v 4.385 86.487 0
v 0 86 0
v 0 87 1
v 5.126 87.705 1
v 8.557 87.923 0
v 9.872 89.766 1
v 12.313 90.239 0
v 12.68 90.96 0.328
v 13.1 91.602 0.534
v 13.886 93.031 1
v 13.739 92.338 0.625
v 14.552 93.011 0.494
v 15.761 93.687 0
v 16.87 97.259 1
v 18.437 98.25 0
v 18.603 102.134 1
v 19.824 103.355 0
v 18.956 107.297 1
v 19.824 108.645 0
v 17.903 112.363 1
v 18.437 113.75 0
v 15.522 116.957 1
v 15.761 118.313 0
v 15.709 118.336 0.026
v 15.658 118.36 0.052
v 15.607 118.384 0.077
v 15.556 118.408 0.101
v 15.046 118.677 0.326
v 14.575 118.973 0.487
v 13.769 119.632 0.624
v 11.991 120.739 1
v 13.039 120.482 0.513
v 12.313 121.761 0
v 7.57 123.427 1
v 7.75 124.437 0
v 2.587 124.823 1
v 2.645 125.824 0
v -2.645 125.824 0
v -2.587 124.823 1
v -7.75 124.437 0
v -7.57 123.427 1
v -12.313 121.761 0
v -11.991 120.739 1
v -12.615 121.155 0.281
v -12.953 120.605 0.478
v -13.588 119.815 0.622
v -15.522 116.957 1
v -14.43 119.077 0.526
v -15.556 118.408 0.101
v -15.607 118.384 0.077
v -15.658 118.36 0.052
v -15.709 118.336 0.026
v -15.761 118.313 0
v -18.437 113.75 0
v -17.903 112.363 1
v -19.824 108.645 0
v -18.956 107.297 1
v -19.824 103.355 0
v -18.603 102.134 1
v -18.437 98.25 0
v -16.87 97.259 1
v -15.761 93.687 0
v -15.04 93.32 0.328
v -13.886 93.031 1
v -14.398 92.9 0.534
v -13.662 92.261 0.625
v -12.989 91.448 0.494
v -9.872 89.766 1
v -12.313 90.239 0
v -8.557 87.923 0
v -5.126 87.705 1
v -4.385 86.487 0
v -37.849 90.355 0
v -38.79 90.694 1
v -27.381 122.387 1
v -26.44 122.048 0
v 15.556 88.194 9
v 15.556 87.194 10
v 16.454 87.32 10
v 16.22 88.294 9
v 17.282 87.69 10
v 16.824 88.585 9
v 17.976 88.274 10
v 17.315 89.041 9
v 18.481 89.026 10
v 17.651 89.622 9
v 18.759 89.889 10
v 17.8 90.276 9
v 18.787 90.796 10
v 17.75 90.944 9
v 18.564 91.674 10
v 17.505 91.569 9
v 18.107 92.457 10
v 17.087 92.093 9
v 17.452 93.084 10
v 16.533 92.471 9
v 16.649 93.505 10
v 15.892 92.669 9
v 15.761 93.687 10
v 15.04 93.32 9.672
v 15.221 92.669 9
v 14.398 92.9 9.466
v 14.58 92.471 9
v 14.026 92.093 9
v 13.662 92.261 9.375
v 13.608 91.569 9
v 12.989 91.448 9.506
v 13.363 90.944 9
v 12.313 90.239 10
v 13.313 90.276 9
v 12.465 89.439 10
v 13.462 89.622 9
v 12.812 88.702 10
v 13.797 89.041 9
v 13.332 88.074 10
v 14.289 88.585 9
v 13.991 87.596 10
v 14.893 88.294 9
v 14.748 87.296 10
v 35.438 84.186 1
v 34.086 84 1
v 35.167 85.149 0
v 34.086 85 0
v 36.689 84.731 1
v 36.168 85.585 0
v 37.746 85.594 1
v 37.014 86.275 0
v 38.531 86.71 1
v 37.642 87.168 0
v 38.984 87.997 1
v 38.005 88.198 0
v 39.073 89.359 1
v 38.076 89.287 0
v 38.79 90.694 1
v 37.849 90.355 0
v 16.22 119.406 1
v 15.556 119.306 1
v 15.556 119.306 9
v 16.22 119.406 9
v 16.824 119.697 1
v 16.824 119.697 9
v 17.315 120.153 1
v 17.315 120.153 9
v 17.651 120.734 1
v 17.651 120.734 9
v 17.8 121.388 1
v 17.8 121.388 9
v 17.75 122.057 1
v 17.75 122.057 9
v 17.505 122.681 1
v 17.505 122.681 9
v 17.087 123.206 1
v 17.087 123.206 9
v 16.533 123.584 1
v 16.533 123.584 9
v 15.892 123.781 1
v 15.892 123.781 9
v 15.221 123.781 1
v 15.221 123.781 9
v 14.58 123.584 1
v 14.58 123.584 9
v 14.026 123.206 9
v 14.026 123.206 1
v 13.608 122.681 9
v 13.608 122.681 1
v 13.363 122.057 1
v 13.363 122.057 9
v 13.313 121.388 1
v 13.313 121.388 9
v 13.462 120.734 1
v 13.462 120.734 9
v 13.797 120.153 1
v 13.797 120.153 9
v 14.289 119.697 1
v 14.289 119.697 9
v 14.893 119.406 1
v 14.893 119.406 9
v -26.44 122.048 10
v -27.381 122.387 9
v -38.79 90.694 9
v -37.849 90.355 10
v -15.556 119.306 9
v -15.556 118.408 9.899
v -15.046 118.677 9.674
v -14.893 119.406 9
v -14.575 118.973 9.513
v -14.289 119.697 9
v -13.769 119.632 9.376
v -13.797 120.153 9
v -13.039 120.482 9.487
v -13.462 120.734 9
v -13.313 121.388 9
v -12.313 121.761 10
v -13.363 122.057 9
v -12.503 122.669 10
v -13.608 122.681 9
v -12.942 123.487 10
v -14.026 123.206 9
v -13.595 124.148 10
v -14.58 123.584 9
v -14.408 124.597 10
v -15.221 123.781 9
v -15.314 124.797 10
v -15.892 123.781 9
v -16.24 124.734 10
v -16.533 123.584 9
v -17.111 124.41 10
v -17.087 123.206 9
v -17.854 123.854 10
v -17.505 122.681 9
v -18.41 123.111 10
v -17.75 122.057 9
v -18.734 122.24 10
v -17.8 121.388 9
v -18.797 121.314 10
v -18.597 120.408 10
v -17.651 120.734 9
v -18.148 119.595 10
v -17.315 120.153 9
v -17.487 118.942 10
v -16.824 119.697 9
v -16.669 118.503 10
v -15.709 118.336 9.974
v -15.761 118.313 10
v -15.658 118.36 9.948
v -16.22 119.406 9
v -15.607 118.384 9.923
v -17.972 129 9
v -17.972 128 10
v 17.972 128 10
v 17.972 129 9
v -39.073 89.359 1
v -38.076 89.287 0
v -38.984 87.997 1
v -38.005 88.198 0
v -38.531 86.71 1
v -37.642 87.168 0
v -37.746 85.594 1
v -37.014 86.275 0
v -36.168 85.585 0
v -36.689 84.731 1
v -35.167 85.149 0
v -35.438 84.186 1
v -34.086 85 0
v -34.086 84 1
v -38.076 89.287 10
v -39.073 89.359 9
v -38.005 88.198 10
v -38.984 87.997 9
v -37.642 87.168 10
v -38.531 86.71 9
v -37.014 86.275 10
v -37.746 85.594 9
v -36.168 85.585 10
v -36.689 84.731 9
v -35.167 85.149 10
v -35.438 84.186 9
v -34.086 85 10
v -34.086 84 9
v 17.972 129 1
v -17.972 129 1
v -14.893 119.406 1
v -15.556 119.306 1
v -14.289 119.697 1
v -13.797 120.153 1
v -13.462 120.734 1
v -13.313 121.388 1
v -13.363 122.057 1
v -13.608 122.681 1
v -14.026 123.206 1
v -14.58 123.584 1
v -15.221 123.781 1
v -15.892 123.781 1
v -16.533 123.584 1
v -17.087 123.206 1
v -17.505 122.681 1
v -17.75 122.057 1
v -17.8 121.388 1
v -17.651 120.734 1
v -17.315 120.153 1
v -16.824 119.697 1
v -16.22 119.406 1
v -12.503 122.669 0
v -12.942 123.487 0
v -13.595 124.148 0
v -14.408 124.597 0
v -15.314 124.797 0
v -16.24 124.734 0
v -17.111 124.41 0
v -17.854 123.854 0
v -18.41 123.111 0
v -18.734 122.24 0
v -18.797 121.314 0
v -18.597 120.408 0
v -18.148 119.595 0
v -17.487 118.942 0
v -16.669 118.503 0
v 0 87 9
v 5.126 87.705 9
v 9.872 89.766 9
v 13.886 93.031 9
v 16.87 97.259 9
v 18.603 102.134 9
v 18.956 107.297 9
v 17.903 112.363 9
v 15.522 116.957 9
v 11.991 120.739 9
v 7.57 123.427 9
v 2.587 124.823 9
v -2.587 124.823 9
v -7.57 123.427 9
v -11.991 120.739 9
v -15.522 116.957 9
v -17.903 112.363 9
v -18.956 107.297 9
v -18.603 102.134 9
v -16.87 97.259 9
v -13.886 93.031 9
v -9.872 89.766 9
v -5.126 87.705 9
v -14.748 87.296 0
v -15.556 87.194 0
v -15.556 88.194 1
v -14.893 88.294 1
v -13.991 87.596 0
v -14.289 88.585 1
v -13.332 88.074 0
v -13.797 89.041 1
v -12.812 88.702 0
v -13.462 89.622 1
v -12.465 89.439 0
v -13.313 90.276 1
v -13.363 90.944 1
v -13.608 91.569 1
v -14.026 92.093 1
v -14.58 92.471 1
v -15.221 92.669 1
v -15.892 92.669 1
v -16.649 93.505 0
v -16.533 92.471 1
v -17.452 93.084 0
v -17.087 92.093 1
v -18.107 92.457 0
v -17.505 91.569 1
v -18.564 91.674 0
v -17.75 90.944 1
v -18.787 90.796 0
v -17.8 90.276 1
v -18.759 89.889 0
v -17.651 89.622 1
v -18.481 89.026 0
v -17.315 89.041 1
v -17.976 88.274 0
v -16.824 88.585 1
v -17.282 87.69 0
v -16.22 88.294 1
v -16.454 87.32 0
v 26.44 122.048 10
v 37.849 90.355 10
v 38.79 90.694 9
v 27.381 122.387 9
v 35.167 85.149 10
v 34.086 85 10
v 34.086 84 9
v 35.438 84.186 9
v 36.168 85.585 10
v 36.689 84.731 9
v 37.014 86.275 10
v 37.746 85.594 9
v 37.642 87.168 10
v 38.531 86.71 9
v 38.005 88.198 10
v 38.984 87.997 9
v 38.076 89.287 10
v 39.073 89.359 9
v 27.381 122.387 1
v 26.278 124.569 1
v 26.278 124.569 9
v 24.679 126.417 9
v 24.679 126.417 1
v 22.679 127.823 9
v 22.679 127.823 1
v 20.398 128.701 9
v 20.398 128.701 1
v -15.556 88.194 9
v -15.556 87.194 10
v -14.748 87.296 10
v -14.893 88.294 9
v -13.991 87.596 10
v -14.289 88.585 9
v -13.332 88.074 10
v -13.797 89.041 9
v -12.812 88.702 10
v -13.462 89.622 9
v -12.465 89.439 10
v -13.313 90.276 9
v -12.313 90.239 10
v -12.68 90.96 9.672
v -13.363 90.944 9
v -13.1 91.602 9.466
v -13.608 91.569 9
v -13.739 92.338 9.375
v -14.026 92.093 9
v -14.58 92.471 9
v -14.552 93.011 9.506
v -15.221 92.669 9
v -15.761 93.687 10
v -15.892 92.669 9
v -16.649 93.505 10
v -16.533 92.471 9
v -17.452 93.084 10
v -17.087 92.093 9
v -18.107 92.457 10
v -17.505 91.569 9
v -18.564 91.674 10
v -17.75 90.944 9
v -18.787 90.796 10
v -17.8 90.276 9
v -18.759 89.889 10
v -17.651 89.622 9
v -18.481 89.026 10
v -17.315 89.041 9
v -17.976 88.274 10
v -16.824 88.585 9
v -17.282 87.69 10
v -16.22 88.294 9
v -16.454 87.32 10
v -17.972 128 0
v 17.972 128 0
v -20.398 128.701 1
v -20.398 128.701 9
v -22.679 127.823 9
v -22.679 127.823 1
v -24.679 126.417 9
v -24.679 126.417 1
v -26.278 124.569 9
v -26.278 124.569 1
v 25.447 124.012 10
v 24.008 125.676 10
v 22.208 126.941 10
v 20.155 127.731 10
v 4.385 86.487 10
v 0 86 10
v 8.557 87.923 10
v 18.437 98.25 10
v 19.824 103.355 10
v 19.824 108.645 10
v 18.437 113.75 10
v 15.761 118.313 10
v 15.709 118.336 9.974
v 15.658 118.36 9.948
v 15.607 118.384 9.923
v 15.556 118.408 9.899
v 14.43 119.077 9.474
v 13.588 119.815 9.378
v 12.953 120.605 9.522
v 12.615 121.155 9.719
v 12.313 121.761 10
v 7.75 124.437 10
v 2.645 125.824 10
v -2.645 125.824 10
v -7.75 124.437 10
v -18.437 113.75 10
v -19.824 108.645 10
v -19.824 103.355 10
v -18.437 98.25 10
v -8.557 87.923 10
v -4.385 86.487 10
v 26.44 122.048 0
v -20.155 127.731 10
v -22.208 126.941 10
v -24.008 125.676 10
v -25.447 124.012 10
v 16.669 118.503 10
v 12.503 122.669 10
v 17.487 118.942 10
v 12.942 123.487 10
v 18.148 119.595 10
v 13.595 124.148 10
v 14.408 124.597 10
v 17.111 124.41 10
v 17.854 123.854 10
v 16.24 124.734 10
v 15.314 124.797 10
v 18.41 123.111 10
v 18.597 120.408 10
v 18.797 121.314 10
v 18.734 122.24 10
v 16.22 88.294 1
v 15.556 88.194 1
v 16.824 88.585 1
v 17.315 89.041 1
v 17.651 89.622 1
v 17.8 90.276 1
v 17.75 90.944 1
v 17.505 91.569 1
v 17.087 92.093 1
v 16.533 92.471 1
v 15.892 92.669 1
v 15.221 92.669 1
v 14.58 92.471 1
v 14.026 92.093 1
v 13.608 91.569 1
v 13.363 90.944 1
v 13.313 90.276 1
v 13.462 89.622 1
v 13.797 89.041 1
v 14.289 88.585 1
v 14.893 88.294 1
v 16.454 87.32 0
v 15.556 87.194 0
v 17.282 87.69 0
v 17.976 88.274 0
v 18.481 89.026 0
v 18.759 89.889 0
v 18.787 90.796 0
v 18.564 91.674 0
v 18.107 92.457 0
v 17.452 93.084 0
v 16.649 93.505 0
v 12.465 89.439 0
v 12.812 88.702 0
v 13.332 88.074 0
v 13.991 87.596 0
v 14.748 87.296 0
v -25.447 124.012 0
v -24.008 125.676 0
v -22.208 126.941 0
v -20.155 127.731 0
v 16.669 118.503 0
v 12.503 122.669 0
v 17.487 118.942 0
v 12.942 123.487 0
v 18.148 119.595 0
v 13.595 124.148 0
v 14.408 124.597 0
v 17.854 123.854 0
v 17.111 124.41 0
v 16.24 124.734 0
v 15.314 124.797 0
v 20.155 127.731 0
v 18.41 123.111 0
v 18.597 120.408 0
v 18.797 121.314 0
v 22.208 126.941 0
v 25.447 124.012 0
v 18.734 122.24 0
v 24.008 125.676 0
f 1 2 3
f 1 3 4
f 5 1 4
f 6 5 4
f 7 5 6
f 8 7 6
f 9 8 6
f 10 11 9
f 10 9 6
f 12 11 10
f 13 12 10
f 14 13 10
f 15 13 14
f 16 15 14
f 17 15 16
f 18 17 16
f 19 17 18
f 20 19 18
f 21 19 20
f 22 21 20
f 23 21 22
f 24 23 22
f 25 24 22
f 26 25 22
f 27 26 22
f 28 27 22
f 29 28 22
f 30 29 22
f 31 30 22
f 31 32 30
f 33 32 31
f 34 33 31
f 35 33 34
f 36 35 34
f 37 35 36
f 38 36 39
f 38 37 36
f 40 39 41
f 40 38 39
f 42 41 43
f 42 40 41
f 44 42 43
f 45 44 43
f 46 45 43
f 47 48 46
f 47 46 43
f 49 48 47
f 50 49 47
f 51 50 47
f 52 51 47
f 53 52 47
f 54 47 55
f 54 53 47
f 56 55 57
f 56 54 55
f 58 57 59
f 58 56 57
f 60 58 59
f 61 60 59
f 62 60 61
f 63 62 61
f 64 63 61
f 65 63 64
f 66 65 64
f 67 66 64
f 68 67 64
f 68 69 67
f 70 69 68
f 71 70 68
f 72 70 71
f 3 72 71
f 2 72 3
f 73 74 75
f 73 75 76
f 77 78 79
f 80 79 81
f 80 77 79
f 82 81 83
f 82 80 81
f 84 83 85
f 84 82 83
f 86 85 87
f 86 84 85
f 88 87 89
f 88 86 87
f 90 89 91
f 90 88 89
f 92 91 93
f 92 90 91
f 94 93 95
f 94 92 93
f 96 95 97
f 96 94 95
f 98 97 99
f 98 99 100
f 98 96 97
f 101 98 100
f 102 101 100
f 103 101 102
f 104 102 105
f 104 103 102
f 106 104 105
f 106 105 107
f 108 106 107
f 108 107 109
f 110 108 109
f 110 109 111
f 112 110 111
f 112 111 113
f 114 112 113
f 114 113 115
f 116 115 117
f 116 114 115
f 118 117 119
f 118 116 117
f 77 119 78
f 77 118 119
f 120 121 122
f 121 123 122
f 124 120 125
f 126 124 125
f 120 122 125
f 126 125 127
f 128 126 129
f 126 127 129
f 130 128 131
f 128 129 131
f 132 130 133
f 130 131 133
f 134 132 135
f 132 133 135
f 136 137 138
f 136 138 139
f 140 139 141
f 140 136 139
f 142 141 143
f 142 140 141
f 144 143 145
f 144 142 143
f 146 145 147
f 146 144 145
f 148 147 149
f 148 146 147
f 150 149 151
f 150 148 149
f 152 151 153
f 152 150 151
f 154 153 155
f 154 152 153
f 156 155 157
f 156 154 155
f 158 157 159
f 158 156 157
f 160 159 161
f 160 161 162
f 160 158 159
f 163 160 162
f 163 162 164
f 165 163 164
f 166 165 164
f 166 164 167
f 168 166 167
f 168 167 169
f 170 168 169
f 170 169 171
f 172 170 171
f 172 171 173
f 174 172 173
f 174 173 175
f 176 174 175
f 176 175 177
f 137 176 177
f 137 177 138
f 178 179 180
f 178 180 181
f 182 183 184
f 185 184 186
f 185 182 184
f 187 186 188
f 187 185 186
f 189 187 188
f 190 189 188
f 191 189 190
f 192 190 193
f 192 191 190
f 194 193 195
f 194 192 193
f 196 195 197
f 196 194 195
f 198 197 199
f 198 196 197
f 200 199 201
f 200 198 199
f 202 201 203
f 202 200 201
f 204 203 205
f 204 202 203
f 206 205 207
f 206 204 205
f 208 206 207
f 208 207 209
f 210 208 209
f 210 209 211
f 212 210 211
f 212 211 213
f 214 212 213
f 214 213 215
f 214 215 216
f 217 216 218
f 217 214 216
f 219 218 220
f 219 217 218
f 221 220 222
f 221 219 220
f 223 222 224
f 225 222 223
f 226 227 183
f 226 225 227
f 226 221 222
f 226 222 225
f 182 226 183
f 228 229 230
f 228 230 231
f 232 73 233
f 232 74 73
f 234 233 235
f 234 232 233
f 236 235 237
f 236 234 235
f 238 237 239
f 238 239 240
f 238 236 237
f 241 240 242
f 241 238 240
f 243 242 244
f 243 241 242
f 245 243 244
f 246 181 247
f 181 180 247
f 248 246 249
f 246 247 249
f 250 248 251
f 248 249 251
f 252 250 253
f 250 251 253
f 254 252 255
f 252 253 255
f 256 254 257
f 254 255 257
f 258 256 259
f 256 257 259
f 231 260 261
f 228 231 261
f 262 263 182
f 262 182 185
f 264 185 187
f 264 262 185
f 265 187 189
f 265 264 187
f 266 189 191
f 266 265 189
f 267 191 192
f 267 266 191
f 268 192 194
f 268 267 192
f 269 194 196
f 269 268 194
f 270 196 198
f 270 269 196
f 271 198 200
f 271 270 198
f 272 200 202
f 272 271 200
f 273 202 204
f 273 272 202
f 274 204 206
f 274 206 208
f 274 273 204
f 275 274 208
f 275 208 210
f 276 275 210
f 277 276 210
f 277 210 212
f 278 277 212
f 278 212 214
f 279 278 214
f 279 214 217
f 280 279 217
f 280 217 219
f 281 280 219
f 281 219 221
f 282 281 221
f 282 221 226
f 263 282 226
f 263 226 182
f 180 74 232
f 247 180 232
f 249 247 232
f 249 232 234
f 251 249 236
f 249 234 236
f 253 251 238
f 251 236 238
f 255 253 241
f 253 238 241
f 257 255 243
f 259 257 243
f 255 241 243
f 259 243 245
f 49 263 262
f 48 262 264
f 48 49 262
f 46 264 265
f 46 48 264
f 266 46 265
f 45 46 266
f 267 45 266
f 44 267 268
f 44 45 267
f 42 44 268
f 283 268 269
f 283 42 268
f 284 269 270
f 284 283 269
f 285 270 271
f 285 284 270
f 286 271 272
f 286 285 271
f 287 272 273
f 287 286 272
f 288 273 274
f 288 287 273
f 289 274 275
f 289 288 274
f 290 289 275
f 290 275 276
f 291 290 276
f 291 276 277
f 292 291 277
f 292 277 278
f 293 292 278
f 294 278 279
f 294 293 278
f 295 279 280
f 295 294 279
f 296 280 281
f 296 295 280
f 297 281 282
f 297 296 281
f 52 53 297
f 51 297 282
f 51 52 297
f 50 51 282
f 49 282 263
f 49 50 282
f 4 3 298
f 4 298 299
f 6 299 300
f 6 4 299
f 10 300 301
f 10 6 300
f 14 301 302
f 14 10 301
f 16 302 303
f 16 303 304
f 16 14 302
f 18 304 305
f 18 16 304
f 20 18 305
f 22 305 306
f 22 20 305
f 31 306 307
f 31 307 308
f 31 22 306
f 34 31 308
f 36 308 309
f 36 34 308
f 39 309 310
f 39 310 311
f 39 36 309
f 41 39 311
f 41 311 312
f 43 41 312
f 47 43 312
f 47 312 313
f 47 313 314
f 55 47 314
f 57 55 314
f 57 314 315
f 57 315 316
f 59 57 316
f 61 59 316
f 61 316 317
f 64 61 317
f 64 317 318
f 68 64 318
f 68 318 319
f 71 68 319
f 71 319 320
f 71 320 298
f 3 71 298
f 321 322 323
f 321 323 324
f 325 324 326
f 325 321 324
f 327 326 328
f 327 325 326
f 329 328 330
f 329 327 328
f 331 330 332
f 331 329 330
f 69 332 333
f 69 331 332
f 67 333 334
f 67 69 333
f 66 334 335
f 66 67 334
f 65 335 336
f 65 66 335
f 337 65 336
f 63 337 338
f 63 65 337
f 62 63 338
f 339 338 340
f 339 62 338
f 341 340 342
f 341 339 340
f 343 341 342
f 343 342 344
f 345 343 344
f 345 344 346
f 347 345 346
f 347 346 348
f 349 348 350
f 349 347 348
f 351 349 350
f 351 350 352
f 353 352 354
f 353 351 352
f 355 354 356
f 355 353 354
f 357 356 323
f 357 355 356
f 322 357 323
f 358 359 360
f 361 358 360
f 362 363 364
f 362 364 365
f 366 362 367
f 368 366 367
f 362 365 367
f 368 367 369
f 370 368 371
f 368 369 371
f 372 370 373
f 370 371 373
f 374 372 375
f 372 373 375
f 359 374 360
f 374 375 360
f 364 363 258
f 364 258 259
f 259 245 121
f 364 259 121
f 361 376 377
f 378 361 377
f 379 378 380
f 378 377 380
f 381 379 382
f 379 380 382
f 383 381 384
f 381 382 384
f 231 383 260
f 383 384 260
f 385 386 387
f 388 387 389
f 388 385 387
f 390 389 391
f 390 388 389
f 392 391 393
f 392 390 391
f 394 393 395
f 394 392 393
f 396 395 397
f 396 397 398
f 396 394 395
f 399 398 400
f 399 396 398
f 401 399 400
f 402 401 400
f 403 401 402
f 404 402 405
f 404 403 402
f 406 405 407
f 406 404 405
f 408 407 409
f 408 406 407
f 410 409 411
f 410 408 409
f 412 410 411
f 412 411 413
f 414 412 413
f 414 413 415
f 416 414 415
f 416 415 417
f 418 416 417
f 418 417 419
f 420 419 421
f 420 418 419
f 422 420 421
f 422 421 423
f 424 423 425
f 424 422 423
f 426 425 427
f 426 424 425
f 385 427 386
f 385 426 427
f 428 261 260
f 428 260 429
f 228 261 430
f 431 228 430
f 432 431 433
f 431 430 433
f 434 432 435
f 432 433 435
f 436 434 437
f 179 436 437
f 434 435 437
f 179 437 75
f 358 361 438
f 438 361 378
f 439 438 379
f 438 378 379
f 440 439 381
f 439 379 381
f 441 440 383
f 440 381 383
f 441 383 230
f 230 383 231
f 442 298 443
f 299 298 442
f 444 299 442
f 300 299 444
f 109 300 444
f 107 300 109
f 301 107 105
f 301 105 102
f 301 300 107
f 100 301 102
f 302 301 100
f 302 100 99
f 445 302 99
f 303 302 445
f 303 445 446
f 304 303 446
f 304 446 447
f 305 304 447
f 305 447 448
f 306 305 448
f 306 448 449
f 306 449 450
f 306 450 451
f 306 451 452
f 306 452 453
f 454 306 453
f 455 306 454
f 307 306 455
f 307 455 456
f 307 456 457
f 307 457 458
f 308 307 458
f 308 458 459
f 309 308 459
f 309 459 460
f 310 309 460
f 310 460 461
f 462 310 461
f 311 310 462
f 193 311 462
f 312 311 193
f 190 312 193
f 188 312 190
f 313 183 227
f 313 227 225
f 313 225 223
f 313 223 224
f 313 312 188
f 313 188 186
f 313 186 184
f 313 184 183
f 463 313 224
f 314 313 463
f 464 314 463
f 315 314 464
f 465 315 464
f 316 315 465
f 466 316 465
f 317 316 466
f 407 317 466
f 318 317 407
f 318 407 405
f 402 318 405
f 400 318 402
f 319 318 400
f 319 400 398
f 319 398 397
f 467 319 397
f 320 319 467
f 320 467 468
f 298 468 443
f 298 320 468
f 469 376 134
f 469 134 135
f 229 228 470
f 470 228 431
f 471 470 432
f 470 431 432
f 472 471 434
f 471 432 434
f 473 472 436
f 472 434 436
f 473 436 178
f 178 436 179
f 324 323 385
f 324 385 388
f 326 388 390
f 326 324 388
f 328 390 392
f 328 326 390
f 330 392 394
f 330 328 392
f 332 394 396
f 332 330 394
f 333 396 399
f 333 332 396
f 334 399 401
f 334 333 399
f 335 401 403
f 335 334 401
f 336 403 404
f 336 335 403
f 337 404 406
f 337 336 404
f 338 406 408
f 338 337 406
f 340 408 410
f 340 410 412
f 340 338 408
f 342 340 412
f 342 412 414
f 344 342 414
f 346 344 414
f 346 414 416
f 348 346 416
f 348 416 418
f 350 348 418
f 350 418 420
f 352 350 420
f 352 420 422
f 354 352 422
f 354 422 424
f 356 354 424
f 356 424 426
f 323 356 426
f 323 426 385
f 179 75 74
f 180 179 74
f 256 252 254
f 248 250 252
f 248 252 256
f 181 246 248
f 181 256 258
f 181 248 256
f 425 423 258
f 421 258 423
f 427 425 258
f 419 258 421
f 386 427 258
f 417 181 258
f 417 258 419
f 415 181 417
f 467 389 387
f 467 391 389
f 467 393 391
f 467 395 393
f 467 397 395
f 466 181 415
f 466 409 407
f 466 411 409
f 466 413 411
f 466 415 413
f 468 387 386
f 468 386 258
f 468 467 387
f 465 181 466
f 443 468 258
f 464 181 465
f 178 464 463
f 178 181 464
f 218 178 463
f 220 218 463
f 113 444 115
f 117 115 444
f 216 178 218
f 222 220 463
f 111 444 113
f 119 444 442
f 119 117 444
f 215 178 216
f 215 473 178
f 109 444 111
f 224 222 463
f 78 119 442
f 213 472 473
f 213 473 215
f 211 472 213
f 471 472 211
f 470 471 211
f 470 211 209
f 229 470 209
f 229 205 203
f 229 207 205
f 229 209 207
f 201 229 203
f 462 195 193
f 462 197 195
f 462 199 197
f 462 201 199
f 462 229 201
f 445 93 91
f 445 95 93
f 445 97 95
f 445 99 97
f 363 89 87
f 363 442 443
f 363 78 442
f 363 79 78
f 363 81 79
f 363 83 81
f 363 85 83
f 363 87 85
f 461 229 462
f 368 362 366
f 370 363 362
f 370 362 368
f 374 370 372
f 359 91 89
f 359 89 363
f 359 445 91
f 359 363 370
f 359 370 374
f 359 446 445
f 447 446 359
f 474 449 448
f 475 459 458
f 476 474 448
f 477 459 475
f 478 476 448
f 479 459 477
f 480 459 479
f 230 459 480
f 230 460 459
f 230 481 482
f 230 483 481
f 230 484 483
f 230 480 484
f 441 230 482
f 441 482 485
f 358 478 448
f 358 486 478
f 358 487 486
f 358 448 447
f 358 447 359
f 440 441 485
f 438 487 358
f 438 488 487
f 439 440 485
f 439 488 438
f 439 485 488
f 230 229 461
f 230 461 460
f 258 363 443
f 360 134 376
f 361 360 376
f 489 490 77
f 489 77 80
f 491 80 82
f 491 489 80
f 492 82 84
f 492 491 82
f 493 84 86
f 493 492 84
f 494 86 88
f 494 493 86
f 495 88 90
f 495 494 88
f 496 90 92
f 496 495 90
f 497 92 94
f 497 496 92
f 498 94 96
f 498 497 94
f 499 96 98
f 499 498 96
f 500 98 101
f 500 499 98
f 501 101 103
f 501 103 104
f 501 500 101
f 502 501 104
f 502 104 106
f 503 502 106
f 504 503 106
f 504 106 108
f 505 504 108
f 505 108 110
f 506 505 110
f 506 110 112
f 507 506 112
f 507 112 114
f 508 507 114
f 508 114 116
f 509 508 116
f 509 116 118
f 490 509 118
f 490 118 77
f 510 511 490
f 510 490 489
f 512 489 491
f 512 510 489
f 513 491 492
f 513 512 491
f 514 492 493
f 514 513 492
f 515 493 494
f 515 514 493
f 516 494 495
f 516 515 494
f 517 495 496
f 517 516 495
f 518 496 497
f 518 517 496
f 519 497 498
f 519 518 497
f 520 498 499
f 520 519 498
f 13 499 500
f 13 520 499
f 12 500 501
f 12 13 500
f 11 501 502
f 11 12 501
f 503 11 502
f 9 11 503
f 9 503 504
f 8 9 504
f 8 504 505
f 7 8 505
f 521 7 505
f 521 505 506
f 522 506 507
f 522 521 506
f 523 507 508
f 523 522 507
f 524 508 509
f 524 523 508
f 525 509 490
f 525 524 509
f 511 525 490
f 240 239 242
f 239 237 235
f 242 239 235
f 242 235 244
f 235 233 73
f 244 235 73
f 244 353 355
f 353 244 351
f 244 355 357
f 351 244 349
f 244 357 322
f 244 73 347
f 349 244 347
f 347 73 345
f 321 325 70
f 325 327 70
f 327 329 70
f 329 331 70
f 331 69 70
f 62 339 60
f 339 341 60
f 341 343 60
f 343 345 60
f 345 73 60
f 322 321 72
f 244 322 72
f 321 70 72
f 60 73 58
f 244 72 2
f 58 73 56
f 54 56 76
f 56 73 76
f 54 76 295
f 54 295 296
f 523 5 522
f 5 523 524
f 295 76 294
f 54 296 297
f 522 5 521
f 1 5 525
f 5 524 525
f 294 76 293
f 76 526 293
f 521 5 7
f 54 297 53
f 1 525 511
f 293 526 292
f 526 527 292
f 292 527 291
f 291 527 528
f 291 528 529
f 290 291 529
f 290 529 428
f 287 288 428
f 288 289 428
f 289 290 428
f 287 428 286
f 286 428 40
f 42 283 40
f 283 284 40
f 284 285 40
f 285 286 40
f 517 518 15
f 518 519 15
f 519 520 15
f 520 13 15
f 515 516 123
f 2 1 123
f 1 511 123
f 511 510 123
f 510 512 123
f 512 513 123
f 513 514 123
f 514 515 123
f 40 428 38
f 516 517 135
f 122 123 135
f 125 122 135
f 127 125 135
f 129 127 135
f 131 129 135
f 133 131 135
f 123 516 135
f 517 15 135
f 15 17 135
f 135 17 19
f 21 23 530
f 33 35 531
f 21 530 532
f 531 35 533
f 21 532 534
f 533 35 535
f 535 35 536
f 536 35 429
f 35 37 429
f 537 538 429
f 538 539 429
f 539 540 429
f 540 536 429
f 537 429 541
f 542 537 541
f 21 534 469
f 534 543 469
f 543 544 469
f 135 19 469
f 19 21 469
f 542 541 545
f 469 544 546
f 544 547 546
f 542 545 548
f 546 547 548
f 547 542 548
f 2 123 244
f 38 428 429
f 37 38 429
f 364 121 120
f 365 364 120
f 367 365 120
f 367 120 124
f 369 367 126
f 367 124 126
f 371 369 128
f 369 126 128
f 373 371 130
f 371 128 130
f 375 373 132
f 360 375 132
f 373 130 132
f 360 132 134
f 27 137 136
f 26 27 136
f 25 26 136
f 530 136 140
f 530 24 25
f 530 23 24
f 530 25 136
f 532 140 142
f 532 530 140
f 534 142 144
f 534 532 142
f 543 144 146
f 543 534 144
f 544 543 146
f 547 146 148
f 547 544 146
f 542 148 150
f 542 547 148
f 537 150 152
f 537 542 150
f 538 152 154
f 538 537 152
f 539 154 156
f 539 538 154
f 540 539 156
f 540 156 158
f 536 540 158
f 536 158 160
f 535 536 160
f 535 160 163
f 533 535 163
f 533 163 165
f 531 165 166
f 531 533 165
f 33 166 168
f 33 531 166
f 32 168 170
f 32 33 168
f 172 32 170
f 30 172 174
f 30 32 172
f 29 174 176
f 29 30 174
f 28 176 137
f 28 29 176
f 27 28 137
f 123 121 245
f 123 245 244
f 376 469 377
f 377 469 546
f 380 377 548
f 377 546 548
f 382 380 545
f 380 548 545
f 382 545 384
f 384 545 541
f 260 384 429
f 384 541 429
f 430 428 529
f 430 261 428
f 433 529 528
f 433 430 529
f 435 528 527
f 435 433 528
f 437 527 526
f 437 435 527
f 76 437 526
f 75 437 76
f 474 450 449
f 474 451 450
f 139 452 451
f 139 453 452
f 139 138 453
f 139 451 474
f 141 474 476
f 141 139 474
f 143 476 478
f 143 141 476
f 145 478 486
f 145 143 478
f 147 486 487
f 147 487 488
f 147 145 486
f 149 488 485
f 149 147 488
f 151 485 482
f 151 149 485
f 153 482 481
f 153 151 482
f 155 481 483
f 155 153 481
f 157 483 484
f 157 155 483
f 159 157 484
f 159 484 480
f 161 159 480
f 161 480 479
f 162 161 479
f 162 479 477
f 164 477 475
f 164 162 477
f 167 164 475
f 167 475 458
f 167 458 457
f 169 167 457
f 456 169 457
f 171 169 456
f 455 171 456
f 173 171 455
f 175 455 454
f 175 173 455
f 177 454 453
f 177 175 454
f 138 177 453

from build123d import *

# Parameters (mm, degrees)
SKETCH1_R           = 19
SKETCH1_R_2         = 2.25
BOSS_EXTRUDE1_DEPTH = 10
CHAMFER1_SIZE       = 1


with BuildPart() as part:
    # Sketch1 → Boss-Extrude1 (new body)
    with BuildSketch(Plane.XY):
        with BuildLine():
            Line((-27.380609914, 122.387194683), (-38.790304957, 90.693597341))
            ThreePointArc((-38.790304957, 90.693597341), (-38.176588293, 86.124933627), (-34.085867898, 84))
            Line((-34.085867898, 84), (-15.12911101, 84))
            Line((-15.12911101, 84), (15.12911101, 84))
            Line((15.12911101, 84), (34.085867898, 84))
            ThreePointArc((34.085867898, 84), (38.176588293, 86.124933627), (38.790304957, 90.693597341))
            Line((38.790304957, 90.693597341), (27.380609914, 122.387194683))
            ThreePointArc((27.380609914, 122.387194683), (23.721868541, 127.181440791), (17.971735796, 129))
            Line((17.971735796, 129), (-17.971735796, 129))
            ThreePointArc((-17.971735796, 129), (-23.721868541, 127.181440791), (-27.380609914, 122.387194683))
        make_face()
        with Locations(Location((0, 106, 0), (0, 0, 270))):
            Circle(SKETCH1_R, mode=Mode.SUBTRACT)
        with Locations(Location((15.556349182, 90.443650818, 0), (0, 0, 270))):
            Circle(SKETCH1_R_2, mode=Mode.SUBTRACT)
        with Locations(Location((-15.556349182, 90.443650818, 0), (0, 0, 270))):
            Circle(SKETCH1_R_2, mode=Mode.SUBTRACT)
        with Locations(Location((15.556349182, 121.556349182, 0), (0, 0, 270))):
            Circle(SKETCH1_R_2, mode=Mode.SUBTRACT)
        with Locations(Location((-15.556349182, 121.556349182, 0), (0, 0, 270))):
            Circle(SKETCH1_R_2, mode=Mode.SUBTRACT)
    extrude(amount=BOSS_EXTRUDE1_DEPTH)

    # Chamfer1
    # the kernel refuses this chamfer: 1 mm, written as the material it takes off along each edge
    with BuildSketch(Plane(origin=(17.971735796, 129, 0), x_dir=(0, 0.027495876610582174, 0.9996219169112968), z_dir=(-1, 0, 0)), Plane(origin=(17.971735796, 129, 10), x_dir=(0, -0.9996219169112968, 0.02749587661058574), z_dir=(-1, 0, 0))) as chamfer1_piece_1:
        Polygon((CHAMFER1_SIZE * 0.999621916911, -CHAMFER1_SIZE * 0.0274958766106), (-CHAMFER1_SIZE * 0.0274958766106, -CHAMFER1_SIZE * 0.999621916911), (0, 0), align=None)
    extrude(amount=35.943471591, mode=Mode.SUBTRACT)
    with BuildSketch(Plane(origin=(17.971735796, 119, 0), x_dir=(0.9408874118687268, 0.33871946827274174, 0), z_dir=(0.33871946827274174, -0.9408874118687268, 0))) as chamfer1_piece_2:
        Polygon((10, CHAMFER1_SIZE), (10 - CHAMFER1_SIZE, 0), (10, 0), align=None)
    revolve(axis=Axis((17.971735796, 119, 0), (0, 0, 1)), revolution_arc=70.201123645, mode=Mode.SUBTRACT)
    with BuildSketch(Plane(origin=(38.790304957, 90.693597341, 0), x_dir=(0.025870524181196484, 0.009313388705230746, 0.9996219169112968), z_dir=(-0.3387194682727421, 0.9408874118687267, 0)), Plane(origin=(-27.380609914, 122.387194683, 0), x_dir=(-0.025870524181196484, 0.00931338870523073, 0.9996219169112968), z_dir=(-0.3387194682727416, -0.9408874118687268, 0)), Plane(origin=(38.790304957, 90.693597341, 10), x_dir=(-0.9405316782499255, -0.33859140416997363, 0.027495876610585557), z_dir=(-0.3387194682727421, 0.9408874118687267, 0))) as chamfer1_piece_3:
        Polygon((CHAMFER1_SIZE * 0.999621916911, -CHAMFER1_SIZE * 0.0274958766106), (-CHAMFER1_SIZE * 0.0274958766106, -CHAMFER1_SIZE * 0.999621916911), (0, 0), align=None)
    extrude(amount=33.684792613, mode=Mode.SUBTRACT)
    with BuildSketch(Plane(origin=(34.085867898, 89, 0), x_dir=(0, -1, 0), z_dir=(-1, 0, 0))) as chamfer1_piece_4:
        Polygon((5, CHAMFER1_SIZE), (5 - CHAMFER1_SIZE, 0), (5, 0), align=None)
    revolve(axis=Axis((34.085867898, 89, 0), (0, 0, 1)), revolution_arc=109.798876355, mode=Mode.SUBTRACT)
    with BuildSketch(Plane(origin=(-34.085867898, 84, 0), x_dir=(0, -0.027495876610582174, 0.9996219169112968), z_dir=(1, 0, 0))) as chamfer1_piece_5:
        Polygon((CHAMFER1_SIZE * 0.999621916911, -CHAMFER1_SIZE * 0.0274958766106), (-CHAMFER1_SIZE * 0.0274958766106, -CHAMFER1_SIZE * 0.999621916911), (0, 0), align=None)
    extrude(amount=68.171735796, mode=Mode.SUBTRACT)
    with BuildSketch(Plane(origin=(-34.085867898, 89, 0), x_dir=(-0.9408874118687287, 0.33871946827273663, 0), z_dir=(0.33871946827273663, 0.9408874118687287, 0))) as chamfer1_piece_6:
        Polygon((5 - CHAMFER1_SIZE, 0), (5, CHAMFER1_SIZE), (5, 0), align=None)
    revolve(axis=Axis((-34.085867898, 89, 0), (0, 0, 1)), revolution_arc=109.798876355, mode=Mode.SUBTRACT)
    with BuildSketch(Plane(origin=(-17.971735796, 119, 0), x_dir=(0, 1, 0), z_dir=(1, 0, 0))) as chamfer1_piece_7:
        Polygon((10 - CHAMFER1_SIZE, 0), (10, CHAMFER1_SIZE), (10, 0), align=None)
    revolve(axis=Axis((-17.971735796, 119, 0), (0, 0, 1)), revolution_arc=70.201123645, mode=Mode.SUBTRACT)
    with BuildSketch(Plane(origin=(0, 106, 0), x_dir=(0, -1, 0), z_dir=(-1, 0, 0))) as chamfer1_piece_8:
        Polygon((19, CHAMFER1_SIZE), (19 + CHAMFER1_SIZE, 0), (19, 0), align=None)
    revolve(axis=Axis((0, 106, 0), (0, 0, 1)), mode=Mode.SUBTRACT)
    with BuildSketch(Plane(origin=(15.556349182, 90.443650818, 0), x_dir=(0, -1, 0), z_dir=(-1, 0, 0))) as chamfer1_piece_9:
        Polygon((2.25, CHAMFER1_SIZE), (2.25 + CHAMFER1_SIZE, 0), (2.25, 0), align=None)
    revolve(axis=Axis((15.556349182, 90.443650818, 0), (0, 0, 1)), mode=Mode.SUBTRACT)
    with BuildSketch(Plane(origin=(-15.556349182, 90.443650818, 0), x_dir=(0, -1, 0), z_dir=(-1, 0, 0))) as chamfer1_piece_10:
        Polygon((2.25, CHAMFER1_SIZE), (2.25 + CHAMFER1_SIZE, 0), (2.25, 0), align=None)
    revolve(axis=Axis((-15.556349182, 90.443650818, 0), (0, 0, 1)), mode=Mode.SUBTRACT)
    with BuildSketch(Plane(origin=(15.556349182, 121.556349182, 0), x_dir=(0, -1, 0), z_dir=(-1, 0, 0))) as chamfer1_piece_11:
        Polygon((2.25, CHAMFER1_SIZE), (2.25 + CHAMFER1_SIZE, 0), (2.25, 0), align=None)
    revolve(axis=Axis((15.556349182, 121.556349182, 0), (0, 0, 1)), mode=Mode.SUBTRACT)
    with BuildSketch(Plane(origin=(-15.556349182, 121.556349182, 0), x_dir=(0, -1, 0), z_dir=(-1, 0, 0))) as chamfer1_piece_12:
        Polygon((2.25, CHAMFER1_SIZE), (2.25 + CHAMFER1_SIZE, 0), (2.25, 0), align=None)
    revolve(axis=Axis((-15.556349182, 121.556349182, 0), (0, 0, 1)), mode=Mode.SUBTRACT)
    with BuildSketch(Plane(origin=(-17.971735796, 119, 10), x_dir=(0, 1, 0), z_dir=(1, 0, 0))) as chamfer1_piece_13:
        Polygon((10 - CHAMFER1_SIZE, 0), (10, -CHAMFER1_SIZE), (10, 0), align=None)
    revolve(axis=Axis((-17.971735796, 119, 10), (0, 0, 1)), revolution_arc=70.201123645, mode=Mode.SUBTRACT)
    with BuildSketch(Plane(origin=(-27.380609914, 122.387194683, 10), x_dir=(-0.025870524181196505, 0.009313388705230739, -0.9996219169112968), z_dir=(-0.3387194682727416, -0.9408874118687268, 0))) as chamfer1_piece_14:
        Polygon((CHAMFER1_SIZE * 0.999621916911, CHAMFER1_SIZE * 0.0274958766106), (-CHAMFER1_SIZE * 0.0274958766106, CHAMFER1_SIZE * 0.999621916911), (0, 0), align=None)
    extrude(amount=33.684792613, mode=Mode.SUBTRACT)
    with BuildSketch(Plane(origin=(-34.085867898, 89, 10), x_dir=(-0.9408874118687287, 0.33871946827273663, 0), z_dir=(0.33871946827273663, 0.9408874118687287, 0))) as chamfer1_piece_15:
        Polygon((5 - CHAMFER1_SIZE, 0), (5, -CHAMFER1_SIZE), (5, 0), align=None)
    revolve(axis=Axis((-34.085867898, 89, 10), (0, 0, 1)), revolution_arc=109.798876355, mode=Mode.SUBTRACT)
    with BuildSketch(Plane(origin=(34.085867898, 84, 10), x_dir=(0, 0.9996219169112968, 0.02749587661058574), z_dir=(-1, 0, 0))) as chamfer1_piece_16:
        Polygon((CHAMFER1_SIZE * 0.999621916911, CHAMFER1_SIZE * 0.0274958766106), (-CHAMFER1_SIZE * 0.0274958766106, CHAMFER1_SIZE * 0.999621916911), (0, 0), align=None)
    extrude(amount=68.171735796, mode=Mode.SUBTRACT)
    with BuildSketch(Plane(origin=(34.085867898, 89, 10), x_dir=(0, -1, 0), z_dir=(-1, 0, 0))) as chamfer1_piece_17:
        Polygon((5 - CHAMFER1_SIZE, 0), (5, -CHAMFER1_SIZE), (5, 0), align=None)
    revolve(axis=Axis((34.085867898, 89, 10), (0, 0, 1)), revolution_arc=109.798876355, mode=Mode.SUBTRACT)
    with BuildSketch(Plane(origin=(17.971735796, 119, 10), x_dir=(0.9408874118687268, 0.33871946827274174, 0), z_dir=(0.33871946827274174, -0.9408874118687268, 0))) as chamfer1_piece_18:
        Polygon((10 - CHAMFER1_SIZE, 0), (10, -CHAMFER1_SIZE), (10, 0), align=None)
    revolve(axis=Axis((17.971735796, 119, 10), (0, 0, 1)), revolution_arc=70.201123645, mode=Mode.SUBTRACT)
    with BuildSketch(Plane(origin=(0, 106, 10), x_dir=(0, -1, 0), z_dir=(-1, 0, 0))) as chamfer1_piece_19:
        Polygon((19 + CHAMFER1_SIZE, 0), (19, -CHAMFER1_SIZE), (19, 0), align=None)
    revolve(axis=Axis((0, 106, 10), (0, 0, 1)), mode=Mode.SUBTRACT)
    with BuildSketch(Plane(origin=(15.556349182, 90.443650818, 10), x_dir=(0, -1, 0), z_dir=(-1, 0, 0))) as chamfer1_piece_20:
        Polygon((2.25 + CHAMFER1_SIZE, 0), (2.25, -CHAMFER1_SIZE), (2.25, 0), align=None)
    revolve(axis=Axis((15.556349182, 90.443650818, 10), (0, 0, 1)), mode=Mode.SUBTRACT)
    with BuildSketch(Plane(origin=(-15.556349182, 90.443650818, 10), x_dir=(0, -1, 0), z_dir=(-1, 0, 0))) as chamfer1_piece_21:
        Polygon((2.25 + CHAMFER1_SIZE, 0), (2.25, -CHAMFER1_SIZE), (2.25, 0), align=None)
    revolve(axis=Axis((-15.556349182, 90.443650818, 10), (0, 0, 1)), mode=Mode.SUBTRACT)
    with BuildSketch(Plane(origin=(15.556349182, 121.556349182, 10), x_dir=(0, -1, 0), z_dir=(-1, 0, 0))) as chamfer1_piece_22:
        Polygon((2.25 + CHAMFER1_SIZE, 0), (2.25, -CHAMFER1_SIZE), (2.25, 0), align=None)
    revolve(axis=Axis((15.556349182, 121.556349182, 10), (0, 0, 1)), mode=Mode.SUBTRACT)
    with BuildSketch(Plane(origin=(-15.556349182, 121.556349182, 10), x_dir=(0, -1, 0), z_dir=(-1, 0, 0))) as chamfer1_piece_23:
        Polygon((2.25 + CHAMFER1_SIZE, 0), (2.25, -CHAMFER1_SIZE), (2.25, 0), align=None)
    revolve(axis=Axis((-15.556349182, 121.556349182, 10), (0, 0, 1)), mode=Mode.SUBTRACT)


solid = part.part
